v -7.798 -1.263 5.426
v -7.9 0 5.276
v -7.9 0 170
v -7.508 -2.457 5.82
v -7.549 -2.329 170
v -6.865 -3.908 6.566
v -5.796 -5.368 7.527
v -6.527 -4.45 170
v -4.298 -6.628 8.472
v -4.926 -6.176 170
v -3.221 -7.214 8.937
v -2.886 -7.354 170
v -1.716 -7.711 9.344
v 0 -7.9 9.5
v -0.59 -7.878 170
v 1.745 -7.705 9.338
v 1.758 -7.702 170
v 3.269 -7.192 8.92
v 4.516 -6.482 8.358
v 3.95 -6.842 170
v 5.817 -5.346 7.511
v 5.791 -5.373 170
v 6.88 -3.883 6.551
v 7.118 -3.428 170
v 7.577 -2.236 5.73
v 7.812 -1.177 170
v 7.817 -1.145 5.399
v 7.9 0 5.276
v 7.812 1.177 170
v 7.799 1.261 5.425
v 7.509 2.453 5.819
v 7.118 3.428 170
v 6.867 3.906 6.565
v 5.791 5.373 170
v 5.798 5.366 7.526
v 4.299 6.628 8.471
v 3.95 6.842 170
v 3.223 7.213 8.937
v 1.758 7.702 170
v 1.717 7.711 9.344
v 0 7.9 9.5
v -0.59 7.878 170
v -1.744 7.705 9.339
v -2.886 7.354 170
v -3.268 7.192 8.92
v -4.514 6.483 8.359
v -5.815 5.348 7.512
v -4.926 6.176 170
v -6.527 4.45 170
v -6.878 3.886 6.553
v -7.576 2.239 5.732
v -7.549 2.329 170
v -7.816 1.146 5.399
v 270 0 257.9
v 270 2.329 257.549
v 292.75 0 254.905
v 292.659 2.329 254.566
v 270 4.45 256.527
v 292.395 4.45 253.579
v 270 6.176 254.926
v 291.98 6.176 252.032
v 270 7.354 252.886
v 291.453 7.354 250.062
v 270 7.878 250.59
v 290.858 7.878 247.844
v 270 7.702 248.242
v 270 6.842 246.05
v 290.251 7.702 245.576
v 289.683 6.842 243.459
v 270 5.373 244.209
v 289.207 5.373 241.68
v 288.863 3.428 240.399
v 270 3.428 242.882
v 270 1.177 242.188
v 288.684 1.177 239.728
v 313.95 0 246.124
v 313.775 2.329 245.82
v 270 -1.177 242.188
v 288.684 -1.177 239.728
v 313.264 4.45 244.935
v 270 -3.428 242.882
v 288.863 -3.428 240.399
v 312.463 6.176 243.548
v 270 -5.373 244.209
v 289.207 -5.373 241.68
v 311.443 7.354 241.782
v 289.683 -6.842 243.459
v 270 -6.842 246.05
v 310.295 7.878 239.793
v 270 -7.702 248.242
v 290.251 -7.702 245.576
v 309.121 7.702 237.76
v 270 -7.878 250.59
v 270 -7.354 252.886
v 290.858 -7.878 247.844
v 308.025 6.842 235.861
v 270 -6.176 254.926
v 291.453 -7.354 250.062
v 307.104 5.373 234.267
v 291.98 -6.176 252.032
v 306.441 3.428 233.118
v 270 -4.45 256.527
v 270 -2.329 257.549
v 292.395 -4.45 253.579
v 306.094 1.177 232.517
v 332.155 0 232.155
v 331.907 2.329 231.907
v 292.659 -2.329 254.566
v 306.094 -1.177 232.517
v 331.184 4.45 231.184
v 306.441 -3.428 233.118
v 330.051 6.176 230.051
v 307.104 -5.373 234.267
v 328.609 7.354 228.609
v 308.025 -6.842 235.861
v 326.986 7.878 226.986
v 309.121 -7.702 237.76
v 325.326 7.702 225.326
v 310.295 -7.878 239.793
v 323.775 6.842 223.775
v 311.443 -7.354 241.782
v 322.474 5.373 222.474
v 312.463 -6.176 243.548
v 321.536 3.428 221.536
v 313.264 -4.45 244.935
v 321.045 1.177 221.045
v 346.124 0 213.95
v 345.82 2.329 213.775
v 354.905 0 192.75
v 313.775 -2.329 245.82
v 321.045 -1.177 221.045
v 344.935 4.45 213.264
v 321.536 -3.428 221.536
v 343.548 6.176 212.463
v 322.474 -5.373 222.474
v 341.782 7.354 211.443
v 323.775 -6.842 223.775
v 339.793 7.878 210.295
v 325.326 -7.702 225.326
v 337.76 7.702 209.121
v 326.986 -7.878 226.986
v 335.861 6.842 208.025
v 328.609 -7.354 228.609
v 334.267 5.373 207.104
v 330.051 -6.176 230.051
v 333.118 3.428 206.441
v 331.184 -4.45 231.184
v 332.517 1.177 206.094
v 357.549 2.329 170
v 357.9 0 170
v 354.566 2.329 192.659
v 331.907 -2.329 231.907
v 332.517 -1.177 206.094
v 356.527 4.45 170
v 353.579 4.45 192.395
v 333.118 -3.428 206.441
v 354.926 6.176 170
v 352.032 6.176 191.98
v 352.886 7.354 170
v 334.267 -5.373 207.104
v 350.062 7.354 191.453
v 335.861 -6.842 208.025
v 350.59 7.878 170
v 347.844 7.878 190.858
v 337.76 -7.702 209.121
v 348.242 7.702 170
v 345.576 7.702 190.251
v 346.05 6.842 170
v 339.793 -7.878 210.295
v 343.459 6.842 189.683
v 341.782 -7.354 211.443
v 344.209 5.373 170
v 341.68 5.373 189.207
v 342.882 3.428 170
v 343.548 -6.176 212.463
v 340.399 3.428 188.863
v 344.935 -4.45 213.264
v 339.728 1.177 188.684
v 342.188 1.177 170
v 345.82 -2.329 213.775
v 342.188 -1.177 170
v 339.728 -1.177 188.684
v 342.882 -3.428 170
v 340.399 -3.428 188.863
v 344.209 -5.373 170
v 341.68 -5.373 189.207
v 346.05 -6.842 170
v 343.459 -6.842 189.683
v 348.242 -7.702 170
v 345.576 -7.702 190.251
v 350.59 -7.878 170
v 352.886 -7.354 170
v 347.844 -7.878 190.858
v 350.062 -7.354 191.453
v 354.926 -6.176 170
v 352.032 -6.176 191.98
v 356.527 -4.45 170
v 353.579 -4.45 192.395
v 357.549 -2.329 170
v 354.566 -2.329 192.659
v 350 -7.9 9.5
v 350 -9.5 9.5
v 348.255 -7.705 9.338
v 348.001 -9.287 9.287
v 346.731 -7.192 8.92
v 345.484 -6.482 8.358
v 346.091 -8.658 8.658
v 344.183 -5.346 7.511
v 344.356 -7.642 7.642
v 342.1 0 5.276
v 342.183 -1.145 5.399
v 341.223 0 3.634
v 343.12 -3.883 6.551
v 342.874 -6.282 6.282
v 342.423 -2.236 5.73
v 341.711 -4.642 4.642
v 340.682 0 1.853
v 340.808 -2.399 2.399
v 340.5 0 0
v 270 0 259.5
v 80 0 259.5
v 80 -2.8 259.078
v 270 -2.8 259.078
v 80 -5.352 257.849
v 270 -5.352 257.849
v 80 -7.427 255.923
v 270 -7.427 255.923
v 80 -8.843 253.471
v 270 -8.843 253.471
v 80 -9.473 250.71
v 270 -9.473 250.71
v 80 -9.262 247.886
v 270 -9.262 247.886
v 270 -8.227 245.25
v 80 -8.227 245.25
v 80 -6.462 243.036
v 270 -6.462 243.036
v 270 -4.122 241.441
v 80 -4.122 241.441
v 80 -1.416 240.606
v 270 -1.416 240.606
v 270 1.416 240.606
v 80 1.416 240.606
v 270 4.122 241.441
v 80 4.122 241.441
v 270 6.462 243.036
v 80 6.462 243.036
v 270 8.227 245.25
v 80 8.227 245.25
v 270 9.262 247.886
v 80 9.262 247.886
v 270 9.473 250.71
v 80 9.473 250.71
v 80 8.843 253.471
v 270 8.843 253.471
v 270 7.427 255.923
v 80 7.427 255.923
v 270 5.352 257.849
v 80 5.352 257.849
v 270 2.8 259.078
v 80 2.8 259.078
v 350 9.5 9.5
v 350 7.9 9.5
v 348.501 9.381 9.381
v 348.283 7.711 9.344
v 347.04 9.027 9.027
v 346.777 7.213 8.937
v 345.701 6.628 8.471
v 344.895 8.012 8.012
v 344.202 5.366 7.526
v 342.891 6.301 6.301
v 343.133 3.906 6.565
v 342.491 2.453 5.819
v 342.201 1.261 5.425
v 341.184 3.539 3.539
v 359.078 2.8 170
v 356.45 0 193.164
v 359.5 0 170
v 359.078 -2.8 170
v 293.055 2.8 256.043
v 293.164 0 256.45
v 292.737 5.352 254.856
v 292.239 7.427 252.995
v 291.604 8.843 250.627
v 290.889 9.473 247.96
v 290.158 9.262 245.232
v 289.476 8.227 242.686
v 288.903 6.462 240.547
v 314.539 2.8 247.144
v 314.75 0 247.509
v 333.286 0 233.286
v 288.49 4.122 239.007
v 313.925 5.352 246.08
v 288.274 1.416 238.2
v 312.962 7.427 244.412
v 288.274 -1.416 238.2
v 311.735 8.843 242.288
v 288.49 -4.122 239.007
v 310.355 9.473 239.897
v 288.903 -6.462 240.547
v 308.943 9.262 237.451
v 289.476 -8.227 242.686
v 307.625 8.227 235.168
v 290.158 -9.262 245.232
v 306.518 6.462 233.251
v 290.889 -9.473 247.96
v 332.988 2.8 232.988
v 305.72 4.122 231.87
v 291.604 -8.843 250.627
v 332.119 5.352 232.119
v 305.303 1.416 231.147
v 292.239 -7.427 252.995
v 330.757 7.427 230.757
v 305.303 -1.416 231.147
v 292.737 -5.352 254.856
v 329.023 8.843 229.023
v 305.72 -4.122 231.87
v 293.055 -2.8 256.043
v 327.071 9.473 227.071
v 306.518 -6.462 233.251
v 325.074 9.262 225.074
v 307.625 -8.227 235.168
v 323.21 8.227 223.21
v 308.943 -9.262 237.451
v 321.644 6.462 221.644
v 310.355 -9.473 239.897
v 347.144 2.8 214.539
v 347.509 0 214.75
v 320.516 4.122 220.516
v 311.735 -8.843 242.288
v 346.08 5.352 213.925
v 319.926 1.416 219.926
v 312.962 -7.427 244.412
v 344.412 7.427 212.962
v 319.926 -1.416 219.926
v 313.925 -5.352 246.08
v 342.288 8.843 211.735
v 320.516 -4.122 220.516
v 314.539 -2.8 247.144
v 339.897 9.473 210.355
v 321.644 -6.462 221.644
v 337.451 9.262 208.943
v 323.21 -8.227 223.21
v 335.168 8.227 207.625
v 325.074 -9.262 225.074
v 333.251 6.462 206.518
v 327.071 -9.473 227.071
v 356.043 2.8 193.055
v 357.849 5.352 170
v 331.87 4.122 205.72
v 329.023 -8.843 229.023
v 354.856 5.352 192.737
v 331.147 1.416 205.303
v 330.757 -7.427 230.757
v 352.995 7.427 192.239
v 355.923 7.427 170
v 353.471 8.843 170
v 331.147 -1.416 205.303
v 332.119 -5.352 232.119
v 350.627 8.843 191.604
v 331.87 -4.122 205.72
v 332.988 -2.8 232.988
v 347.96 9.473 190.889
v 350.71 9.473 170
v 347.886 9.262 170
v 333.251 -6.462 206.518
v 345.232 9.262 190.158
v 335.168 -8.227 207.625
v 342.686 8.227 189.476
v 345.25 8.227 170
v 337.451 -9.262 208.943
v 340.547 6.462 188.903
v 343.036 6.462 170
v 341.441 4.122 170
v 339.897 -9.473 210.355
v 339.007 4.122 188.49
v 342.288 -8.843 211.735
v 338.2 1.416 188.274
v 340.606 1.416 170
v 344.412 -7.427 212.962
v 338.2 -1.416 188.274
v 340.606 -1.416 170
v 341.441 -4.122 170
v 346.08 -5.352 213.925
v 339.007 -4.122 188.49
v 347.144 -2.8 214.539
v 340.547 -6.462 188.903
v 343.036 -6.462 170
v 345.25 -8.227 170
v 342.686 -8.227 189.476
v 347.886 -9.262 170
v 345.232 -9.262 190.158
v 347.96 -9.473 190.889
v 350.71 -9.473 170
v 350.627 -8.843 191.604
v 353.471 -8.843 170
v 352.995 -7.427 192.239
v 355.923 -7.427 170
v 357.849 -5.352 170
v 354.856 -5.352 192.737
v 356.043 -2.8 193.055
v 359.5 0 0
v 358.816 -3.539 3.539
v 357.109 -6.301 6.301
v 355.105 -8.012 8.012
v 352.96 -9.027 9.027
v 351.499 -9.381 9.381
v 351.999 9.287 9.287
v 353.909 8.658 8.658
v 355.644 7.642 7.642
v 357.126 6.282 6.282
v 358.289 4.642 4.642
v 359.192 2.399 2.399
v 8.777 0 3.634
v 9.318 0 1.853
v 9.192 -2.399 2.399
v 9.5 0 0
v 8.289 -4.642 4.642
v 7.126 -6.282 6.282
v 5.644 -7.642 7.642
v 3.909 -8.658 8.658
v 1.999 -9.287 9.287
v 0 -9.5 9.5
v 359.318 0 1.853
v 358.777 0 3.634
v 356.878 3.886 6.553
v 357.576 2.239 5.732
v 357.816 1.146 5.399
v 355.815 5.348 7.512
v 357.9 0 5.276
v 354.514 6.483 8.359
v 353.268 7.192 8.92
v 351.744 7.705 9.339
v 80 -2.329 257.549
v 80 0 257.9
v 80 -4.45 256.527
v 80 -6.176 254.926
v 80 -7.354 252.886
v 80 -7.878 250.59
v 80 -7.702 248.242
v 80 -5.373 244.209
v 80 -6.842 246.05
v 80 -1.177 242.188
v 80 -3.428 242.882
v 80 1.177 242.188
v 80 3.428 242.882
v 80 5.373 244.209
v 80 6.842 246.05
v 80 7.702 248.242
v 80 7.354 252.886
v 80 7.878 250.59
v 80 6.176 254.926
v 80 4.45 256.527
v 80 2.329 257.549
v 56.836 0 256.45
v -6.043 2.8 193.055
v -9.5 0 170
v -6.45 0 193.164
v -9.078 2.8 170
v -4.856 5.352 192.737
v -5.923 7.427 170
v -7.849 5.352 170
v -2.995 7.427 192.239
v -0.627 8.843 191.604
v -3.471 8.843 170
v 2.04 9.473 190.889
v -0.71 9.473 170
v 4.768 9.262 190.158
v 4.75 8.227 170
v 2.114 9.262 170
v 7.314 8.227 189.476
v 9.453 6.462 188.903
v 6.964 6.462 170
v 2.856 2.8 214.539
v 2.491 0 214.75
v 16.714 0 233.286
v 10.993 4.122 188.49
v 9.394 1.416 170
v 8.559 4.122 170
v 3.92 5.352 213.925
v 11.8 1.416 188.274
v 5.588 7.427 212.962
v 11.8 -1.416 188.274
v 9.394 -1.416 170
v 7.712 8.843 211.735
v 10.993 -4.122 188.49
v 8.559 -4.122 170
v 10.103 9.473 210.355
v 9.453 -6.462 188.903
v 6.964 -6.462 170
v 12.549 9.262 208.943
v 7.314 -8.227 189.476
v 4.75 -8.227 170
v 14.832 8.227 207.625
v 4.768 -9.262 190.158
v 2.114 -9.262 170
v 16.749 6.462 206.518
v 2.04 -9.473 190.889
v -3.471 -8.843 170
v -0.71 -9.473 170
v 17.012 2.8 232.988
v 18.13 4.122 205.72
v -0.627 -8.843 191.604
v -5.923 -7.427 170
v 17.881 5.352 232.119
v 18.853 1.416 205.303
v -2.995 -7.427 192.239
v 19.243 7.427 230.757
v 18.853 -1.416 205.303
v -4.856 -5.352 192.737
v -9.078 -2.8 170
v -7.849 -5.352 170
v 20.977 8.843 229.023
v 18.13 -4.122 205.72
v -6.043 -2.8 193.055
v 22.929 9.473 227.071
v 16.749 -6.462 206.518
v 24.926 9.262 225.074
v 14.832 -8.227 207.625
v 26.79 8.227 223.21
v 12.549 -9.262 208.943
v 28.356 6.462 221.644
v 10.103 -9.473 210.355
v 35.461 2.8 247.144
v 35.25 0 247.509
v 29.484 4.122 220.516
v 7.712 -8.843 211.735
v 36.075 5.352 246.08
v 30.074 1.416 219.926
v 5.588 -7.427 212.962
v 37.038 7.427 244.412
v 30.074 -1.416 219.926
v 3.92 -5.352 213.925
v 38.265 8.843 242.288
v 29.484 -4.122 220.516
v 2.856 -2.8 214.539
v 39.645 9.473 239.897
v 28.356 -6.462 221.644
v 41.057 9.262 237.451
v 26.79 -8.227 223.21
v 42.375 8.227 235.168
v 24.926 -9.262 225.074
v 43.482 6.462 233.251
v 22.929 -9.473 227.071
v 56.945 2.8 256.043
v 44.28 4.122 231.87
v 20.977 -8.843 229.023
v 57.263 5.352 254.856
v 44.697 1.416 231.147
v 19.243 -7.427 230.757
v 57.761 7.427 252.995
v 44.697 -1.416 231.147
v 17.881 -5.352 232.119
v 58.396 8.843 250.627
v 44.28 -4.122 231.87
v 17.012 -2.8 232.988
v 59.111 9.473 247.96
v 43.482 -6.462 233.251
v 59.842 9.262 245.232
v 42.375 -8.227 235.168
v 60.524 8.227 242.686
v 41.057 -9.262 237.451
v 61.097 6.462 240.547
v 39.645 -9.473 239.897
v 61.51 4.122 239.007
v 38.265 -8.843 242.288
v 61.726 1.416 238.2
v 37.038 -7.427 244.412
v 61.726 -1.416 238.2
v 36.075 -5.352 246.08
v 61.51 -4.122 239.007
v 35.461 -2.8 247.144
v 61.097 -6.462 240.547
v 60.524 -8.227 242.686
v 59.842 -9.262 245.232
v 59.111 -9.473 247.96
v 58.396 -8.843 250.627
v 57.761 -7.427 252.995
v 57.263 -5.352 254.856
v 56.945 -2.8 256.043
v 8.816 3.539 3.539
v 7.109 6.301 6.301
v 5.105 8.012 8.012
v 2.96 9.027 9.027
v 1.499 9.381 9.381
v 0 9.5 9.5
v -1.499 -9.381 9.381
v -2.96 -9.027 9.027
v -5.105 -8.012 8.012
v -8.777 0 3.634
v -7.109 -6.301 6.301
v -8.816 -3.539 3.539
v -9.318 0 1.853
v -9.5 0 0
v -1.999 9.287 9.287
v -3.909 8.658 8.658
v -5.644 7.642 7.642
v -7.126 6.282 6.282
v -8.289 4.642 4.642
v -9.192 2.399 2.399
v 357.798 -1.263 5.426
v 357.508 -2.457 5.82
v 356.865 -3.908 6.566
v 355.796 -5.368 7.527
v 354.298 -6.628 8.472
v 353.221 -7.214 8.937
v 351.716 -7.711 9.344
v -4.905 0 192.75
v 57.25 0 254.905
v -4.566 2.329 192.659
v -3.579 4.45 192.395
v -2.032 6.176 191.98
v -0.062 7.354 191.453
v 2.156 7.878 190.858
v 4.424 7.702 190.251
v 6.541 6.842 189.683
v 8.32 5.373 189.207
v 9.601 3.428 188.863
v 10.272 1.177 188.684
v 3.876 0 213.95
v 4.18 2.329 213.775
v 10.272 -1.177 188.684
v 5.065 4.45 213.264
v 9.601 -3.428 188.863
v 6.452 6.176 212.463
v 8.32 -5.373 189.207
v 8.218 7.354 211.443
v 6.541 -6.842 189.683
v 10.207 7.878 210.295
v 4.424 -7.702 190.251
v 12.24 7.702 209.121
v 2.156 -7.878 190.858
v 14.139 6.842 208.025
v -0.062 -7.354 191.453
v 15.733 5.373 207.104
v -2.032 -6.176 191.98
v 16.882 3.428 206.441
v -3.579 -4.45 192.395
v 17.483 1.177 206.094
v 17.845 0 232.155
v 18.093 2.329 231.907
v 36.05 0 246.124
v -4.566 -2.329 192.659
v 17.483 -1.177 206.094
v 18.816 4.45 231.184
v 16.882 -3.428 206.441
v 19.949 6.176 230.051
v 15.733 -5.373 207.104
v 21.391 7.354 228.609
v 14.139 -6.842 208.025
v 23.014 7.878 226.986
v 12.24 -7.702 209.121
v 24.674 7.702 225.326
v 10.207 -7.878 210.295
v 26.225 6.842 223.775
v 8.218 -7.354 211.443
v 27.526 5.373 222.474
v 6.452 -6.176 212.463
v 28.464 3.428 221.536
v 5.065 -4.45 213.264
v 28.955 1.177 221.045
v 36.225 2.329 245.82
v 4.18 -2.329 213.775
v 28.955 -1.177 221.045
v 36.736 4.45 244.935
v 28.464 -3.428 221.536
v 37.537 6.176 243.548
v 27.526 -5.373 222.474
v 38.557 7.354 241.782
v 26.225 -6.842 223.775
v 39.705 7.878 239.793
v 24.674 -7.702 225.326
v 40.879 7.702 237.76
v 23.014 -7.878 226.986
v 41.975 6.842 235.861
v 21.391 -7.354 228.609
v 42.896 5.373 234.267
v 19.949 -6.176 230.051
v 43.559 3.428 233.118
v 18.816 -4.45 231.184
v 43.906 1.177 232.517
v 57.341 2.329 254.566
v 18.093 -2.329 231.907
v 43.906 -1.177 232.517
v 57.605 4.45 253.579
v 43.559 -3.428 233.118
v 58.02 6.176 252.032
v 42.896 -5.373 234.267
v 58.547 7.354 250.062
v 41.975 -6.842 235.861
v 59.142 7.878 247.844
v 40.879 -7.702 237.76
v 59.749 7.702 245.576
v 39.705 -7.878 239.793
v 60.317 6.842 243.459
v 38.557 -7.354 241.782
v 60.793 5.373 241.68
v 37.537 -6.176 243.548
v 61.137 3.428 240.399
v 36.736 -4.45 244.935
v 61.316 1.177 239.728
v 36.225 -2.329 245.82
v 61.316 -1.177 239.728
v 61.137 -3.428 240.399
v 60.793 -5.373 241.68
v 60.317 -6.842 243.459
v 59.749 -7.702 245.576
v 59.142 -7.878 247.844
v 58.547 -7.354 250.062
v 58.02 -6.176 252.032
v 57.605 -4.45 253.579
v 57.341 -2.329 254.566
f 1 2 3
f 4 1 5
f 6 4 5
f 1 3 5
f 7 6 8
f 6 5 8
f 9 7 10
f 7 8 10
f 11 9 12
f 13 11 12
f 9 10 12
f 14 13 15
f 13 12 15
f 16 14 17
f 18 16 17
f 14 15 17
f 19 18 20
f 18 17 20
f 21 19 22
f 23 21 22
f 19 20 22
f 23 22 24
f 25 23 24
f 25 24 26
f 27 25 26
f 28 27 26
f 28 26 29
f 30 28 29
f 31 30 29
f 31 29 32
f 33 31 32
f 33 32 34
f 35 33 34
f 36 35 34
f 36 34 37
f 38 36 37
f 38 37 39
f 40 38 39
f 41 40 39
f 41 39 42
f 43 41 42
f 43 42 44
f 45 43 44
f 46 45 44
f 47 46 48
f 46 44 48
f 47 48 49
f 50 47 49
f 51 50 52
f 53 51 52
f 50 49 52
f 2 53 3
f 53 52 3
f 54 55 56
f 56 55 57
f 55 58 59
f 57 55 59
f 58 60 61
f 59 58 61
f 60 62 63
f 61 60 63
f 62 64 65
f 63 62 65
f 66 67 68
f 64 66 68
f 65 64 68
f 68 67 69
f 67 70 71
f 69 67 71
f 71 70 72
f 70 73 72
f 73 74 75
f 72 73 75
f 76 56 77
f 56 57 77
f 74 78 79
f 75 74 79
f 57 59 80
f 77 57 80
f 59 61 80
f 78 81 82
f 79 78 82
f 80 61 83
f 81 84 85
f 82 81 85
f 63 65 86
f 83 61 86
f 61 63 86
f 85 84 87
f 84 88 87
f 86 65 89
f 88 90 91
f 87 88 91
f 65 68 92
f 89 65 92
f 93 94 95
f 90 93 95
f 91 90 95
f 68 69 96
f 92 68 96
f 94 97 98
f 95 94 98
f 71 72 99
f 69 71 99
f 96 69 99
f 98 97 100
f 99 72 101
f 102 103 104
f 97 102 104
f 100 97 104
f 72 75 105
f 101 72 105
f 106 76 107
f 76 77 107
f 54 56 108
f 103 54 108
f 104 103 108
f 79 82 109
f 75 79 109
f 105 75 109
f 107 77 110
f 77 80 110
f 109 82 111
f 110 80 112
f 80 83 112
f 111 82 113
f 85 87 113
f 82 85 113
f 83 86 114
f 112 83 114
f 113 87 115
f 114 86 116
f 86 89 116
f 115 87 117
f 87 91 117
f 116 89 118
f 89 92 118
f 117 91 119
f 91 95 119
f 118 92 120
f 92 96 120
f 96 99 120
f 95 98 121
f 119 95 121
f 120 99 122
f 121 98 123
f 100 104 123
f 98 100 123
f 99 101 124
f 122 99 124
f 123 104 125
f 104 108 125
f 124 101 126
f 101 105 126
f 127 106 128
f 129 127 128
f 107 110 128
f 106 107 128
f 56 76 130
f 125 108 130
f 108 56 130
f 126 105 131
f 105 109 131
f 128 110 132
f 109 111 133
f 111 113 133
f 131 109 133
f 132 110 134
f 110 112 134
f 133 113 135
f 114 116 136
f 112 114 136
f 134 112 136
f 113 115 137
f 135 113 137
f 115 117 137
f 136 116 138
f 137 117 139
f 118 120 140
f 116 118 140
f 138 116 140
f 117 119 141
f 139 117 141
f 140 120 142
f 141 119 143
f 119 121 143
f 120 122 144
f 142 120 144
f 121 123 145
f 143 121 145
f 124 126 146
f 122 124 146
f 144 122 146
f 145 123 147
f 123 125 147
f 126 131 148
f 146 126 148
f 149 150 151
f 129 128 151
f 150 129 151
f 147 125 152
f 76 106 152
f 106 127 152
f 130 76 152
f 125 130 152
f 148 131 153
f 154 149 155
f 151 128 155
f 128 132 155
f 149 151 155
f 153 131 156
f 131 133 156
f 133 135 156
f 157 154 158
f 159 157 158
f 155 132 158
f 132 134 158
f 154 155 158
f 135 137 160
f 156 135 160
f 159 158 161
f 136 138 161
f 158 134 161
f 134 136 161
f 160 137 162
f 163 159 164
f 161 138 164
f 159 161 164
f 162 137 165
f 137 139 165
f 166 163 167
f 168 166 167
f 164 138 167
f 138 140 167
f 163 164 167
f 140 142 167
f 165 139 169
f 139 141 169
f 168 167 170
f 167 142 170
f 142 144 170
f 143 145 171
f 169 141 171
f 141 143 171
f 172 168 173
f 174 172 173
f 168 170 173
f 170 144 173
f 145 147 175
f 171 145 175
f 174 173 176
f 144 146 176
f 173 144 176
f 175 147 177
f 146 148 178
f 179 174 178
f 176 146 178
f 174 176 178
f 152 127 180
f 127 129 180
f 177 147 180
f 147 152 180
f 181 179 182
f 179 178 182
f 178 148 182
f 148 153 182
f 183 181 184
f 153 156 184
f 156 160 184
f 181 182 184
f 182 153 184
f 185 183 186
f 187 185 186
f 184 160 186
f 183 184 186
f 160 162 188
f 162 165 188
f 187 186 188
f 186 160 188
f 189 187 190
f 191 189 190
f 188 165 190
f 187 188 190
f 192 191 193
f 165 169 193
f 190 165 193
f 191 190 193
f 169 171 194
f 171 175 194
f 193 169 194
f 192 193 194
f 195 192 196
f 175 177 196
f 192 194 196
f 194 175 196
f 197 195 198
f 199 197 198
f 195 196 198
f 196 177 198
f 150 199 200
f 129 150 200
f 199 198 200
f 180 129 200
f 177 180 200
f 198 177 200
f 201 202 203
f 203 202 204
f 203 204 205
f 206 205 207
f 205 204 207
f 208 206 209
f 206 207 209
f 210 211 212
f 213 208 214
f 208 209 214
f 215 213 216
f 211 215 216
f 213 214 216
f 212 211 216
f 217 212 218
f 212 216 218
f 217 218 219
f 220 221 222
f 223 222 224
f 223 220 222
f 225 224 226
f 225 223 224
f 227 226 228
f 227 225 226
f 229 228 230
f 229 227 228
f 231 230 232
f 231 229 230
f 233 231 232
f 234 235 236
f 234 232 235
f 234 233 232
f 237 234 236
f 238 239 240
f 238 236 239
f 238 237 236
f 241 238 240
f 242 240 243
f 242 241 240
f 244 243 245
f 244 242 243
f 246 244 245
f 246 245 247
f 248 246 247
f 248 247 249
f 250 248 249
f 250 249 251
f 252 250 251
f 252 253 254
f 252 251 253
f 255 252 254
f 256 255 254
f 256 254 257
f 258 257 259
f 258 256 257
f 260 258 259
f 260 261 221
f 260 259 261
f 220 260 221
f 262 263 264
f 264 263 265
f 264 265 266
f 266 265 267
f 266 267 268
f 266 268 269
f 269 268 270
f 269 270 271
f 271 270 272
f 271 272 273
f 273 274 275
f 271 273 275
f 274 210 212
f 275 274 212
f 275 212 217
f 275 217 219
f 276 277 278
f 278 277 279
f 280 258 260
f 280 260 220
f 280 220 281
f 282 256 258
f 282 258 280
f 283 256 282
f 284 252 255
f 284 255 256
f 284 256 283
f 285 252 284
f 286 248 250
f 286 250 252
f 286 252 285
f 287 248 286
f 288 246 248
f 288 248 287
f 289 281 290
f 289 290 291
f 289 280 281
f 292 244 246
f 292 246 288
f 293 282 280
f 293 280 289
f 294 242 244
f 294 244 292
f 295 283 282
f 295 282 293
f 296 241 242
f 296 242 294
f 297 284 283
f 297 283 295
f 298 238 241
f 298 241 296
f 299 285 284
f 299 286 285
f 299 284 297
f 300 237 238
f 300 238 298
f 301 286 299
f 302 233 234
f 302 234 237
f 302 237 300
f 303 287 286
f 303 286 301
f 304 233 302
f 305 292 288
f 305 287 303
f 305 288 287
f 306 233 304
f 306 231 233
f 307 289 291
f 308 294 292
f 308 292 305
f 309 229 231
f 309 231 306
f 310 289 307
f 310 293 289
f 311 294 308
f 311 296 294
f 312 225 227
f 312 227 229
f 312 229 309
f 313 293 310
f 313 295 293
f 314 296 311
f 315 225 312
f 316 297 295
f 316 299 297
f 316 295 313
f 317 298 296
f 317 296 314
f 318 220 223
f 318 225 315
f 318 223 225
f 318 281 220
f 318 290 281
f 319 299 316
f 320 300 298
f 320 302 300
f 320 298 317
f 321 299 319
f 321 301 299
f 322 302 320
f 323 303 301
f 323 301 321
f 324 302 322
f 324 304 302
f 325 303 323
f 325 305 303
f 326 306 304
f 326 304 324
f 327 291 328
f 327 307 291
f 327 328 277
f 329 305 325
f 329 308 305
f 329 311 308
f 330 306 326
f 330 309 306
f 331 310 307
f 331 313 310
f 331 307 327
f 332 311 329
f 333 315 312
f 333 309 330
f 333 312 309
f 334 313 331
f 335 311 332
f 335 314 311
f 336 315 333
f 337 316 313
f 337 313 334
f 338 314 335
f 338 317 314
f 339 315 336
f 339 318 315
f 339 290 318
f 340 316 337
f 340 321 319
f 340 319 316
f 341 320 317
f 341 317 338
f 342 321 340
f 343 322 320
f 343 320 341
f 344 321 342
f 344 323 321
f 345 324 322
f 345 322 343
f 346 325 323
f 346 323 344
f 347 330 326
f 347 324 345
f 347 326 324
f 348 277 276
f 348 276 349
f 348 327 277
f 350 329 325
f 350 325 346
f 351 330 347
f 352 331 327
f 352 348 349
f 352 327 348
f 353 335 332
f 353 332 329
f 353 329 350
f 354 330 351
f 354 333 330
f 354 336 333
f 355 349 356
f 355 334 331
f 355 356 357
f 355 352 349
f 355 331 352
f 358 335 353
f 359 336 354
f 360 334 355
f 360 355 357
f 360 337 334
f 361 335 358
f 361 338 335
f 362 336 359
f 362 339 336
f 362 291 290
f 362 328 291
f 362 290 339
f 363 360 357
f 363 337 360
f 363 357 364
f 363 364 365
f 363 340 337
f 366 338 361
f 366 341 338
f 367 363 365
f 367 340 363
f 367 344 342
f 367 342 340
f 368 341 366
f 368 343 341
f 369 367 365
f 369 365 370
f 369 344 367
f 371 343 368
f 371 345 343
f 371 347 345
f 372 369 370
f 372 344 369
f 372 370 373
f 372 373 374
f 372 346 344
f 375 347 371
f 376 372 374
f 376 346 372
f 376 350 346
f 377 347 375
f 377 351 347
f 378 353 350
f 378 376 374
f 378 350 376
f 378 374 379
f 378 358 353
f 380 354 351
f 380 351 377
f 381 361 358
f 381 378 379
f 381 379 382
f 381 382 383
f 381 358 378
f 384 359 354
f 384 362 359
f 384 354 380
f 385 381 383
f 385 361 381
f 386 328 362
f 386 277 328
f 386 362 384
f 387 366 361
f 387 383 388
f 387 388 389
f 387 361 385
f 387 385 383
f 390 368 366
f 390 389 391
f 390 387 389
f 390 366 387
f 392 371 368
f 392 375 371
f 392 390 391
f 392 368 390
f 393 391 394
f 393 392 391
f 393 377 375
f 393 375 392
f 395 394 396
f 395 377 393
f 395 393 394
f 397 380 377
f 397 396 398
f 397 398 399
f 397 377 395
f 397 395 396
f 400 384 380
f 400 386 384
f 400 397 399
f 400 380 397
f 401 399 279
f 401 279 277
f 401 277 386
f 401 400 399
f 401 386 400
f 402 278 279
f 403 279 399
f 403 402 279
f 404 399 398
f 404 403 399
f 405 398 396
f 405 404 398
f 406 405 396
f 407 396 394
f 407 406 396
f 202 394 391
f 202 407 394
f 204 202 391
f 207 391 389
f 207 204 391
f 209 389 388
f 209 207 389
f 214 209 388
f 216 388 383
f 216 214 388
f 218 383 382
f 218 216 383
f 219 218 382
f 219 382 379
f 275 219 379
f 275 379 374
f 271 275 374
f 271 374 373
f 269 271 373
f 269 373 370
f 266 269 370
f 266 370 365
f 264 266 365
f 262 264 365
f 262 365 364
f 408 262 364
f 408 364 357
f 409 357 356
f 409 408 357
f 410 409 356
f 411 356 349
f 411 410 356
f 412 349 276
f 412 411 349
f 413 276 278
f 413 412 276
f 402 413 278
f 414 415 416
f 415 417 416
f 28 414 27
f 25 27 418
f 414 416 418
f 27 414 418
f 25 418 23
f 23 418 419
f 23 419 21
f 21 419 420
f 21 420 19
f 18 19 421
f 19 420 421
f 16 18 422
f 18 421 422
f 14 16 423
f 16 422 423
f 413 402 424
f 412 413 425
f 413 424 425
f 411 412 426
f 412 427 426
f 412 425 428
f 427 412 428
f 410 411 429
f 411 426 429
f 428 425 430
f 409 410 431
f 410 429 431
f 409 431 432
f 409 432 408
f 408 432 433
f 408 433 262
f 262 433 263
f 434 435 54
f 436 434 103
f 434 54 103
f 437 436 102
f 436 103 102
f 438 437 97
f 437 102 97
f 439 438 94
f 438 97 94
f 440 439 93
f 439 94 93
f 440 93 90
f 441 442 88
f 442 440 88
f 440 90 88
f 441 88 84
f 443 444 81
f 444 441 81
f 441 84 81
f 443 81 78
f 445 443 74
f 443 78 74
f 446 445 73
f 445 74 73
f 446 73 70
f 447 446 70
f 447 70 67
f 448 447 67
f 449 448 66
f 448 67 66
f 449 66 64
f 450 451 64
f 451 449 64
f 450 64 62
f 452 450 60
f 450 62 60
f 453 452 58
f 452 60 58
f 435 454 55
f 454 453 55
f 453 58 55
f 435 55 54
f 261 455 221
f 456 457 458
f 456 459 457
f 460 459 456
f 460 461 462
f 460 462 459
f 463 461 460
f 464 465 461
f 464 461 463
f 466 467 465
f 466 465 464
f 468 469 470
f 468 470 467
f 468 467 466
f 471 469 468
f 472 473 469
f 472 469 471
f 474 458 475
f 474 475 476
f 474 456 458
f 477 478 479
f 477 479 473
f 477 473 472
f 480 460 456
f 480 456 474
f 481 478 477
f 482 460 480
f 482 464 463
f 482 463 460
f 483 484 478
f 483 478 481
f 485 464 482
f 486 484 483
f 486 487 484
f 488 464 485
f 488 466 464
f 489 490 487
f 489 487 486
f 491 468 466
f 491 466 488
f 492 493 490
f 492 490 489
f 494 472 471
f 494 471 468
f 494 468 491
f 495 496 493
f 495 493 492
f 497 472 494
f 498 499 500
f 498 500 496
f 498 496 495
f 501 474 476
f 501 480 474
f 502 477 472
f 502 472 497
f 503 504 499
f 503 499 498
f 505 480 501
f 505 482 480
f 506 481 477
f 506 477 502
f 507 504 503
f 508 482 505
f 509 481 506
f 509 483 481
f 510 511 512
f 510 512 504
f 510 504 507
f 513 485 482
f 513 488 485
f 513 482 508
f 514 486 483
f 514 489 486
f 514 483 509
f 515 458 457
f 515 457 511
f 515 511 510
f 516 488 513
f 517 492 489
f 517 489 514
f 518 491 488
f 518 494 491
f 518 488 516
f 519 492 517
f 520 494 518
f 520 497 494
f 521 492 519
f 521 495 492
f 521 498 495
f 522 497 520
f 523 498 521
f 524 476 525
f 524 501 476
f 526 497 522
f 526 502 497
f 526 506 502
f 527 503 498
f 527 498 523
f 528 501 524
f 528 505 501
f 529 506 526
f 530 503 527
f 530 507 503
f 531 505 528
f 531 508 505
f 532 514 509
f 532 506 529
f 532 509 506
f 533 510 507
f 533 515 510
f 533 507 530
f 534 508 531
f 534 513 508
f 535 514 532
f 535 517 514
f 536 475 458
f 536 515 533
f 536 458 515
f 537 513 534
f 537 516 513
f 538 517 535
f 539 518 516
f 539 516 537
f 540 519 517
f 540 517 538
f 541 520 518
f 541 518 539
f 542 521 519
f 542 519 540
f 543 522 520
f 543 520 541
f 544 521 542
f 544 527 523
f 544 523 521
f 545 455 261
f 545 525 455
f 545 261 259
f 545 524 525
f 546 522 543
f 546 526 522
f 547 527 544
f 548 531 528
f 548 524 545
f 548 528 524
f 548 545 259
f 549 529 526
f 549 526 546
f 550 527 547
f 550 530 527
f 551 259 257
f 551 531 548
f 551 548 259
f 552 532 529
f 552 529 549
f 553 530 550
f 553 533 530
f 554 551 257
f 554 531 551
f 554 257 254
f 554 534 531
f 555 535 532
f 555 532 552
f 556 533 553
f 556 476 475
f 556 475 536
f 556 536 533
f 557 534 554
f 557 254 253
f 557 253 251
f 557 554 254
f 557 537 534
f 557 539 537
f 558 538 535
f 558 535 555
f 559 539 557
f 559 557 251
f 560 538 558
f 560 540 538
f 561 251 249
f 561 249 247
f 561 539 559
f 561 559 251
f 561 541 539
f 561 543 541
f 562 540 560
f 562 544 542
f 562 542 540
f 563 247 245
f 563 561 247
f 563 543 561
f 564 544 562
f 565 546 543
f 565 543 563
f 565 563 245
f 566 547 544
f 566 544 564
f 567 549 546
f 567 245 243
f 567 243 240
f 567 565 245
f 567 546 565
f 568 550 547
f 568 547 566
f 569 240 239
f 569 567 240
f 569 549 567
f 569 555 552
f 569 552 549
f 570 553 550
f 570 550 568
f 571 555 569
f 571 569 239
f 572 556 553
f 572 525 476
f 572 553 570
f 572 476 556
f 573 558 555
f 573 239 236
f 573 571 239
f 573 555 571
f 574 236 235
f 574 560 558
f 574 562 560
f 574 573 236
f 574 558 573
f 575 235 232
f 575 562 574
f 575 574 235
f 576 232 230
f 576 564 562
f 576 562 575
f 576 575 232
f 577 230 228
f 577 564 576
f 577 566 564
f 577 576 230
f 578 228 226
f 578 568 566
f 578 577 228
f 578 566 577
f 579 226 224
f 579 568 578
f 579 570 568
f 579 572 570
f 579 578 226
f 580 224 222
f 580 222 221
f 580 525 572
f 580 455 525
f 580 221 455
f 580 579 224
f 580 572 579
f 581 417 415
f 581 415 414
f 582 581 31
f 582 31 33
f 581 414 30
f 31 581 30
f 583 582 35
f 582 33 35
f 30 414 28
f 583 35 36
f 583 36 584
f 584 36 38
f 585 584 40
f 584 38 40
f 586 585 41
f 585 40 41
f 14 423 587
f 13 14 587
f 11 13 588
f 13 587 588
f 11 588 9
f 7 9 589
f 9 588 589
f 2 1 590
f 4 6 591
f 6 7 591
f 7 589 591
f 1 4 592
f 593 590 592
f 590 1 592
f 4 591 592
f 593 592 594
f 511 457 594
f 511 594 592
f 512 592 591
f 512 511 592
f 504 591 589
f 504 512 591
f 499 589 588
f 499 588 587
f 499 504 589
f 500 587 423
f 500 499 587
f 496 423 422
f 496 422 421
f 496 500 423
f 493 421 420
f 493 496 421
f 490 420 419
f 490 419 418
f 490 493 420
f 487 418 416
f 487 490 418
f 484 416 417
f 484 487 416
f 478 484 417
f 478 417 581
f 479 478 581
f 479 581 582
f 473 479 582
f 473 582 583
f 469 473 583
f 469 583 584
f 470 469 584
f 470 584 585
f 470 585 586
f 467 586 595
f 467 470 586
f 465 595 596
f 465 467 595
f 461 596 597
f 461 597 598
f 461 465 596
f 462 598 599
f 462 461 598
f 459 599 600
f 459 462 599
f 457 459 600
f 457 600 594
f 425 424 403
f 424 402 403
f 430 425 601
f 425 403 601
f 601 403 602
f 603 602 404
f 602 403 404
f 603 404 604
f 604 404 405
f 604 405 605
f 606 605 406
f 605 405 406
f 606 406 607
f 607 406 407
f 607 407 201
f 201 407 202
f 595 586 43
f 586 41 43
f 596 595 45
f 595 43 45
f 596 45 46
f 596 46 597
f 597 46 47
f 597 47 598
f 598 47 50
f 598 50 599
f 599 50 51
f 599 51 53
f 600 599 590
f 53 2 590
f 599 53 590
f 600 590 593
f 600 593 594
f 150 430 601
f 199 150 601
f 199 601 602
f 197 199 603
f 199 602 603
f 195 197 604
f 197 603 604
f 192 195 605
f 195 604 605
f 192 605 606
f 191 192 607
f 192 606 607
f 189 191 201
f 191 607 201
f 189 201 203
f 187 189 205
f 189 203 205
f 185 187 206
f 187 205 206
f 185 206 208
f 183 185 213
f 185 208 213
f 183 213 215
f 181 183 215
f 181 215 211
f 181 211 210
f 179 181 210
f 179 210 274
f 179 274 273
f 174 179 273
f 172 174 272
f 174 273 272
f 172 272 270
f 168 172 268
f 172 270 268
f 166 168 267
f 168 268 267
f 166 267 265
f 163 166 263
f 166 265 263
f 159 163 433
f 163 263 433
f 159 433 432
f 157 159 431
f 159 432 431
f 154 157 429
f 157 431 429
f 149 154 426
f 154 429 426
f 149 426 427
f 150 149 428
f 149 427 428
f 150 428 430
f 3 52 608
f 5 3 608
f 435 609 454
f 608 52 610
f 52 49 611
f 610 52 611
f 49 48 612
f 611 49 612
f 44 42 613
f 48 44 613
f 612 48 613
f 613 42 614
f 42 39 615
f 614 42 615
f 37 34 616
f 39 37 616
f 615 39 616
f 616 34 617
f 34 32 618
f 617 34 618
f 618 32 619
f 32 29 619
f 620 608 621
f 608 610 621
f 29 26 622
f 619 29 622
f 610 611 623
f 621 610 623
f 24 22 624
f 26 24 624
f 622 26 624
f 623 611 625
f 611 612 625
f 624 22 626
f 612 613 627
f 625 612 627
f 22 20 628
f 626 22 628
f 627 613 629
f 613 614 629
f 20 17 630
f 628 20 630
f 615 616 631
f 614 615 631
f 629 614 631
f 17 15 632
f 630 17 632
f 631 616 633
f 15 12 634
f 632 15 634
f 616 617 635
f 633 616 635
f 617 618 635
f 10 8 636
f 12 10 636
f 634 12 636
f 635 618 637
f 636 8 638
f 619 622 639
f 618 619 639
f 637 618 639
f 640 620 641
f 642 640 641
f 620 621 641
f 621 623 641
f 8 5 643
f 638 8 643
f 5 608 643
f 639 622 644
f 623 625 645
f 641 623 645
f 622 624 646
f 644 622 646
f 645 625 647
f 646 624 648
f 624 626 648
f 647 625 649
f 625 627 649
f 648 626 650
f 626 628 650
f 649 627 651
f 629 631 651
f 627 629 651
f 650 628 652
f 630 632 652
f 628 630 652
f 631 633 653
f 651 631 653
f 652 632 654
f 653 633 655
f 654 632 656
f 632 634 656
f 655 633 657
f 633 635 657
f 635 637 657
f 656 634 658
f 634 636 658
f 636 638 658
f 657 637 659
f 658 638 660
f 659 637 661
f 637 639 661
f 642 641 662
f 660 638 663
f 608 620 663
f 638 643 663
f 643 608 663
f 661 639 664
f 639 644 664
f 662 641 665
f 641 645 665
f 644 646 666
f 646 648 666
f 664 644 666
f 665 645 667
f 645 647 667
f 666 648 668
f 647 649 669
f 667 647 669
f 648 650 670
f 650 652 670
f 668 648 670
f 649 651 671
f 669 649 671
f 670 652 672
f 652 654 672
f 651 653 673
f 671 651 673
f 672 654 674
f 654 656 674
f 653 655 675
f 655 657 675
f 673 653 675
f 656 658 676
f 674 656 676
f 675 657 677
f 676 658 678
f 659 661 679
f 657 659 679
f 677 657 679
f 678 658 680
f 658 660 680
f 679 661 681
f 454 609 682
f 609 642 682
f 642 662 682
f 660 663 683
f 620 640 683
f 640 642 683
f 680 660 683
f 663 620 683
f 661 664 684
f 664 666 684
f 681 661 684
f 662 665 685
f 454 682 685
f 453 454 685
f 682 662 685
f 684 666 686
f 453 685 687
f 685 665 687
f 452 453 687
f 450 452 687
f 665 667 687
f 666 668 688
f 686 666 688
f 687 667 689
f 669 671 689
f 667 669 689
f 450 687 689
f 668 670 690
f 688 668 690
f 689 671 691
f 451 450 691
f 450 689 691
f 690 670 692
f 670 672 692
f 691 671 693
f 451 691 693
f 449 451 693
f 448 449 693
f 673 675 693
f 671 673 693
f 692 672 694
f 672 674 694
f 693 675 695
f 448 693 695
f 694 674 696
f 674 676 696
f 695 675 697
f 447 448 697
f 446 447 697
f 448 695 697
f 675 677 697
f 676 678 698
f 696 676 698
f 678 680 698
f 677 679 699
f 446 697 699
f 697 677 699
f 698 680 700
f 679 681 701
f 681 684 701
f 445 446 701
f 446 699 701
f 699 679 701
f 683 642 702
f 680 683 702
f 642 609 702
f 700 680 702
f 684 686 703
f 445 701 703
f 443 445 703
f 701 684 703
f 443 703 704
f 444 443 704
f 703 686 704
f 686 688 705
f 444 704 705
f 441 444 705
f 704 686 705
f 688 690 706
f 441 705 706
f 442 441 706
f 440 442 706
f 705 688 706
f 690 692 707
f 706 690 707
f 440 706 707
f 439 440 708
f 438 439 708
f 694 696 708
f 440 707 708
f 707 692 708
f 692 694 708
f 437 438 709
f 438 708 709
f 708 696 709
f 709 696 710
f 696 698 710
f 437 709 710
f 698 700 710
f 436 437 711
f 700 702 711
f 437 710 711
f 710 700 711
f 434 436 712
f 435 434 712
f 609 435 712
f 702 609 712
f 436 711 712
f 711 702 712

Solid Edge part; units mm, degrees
sketch "Sketch1" plane through (0, 0, 0) normal (0, -1, 0) x (1, 0, 0)
  line L0 (0, 0) -> (0, 170)
  arc A0 (0, 170) -> (80, 250) centre (80, 170) cw
  line L1 (80, 250) -> (270, 250)
  arc A1 (270, 250) -> (350, 170) centre (270, 170) cw
  line L2 (350, 170) -> (350, 0)
  dimension "D1" = 350
  dimension "D2" = 80
  dimension "D3" = 250
sketch "Sketch2" plane through (0, 0, 0) normal (0, 0, -1) x (-1, 0, 0)
  circle A0 centre (0, 0) radius 9.5
  dimension "D1" = 19
sweep "SweptProtrusion_1" add profiles "Sketch2" path "Sketch1"
shell "Thinwall_1" thickness 1.6 removed faces 4 at (6.5233, -6.1433, 0) at (343.4767, -6.1433, 0) at (6.5233, -6.1433, 0) at (343.4767, -6.1433, 0)
hole "Hole_1" at (0, 0, 0) direction (0, -1, 0) diameter 19 end through all both ways yes
hole "Hole1" at (350, 0, 0) direction (0, -1, 0) diameter 19 end through all both ways yes
properties material "Aluminum, 1060"
